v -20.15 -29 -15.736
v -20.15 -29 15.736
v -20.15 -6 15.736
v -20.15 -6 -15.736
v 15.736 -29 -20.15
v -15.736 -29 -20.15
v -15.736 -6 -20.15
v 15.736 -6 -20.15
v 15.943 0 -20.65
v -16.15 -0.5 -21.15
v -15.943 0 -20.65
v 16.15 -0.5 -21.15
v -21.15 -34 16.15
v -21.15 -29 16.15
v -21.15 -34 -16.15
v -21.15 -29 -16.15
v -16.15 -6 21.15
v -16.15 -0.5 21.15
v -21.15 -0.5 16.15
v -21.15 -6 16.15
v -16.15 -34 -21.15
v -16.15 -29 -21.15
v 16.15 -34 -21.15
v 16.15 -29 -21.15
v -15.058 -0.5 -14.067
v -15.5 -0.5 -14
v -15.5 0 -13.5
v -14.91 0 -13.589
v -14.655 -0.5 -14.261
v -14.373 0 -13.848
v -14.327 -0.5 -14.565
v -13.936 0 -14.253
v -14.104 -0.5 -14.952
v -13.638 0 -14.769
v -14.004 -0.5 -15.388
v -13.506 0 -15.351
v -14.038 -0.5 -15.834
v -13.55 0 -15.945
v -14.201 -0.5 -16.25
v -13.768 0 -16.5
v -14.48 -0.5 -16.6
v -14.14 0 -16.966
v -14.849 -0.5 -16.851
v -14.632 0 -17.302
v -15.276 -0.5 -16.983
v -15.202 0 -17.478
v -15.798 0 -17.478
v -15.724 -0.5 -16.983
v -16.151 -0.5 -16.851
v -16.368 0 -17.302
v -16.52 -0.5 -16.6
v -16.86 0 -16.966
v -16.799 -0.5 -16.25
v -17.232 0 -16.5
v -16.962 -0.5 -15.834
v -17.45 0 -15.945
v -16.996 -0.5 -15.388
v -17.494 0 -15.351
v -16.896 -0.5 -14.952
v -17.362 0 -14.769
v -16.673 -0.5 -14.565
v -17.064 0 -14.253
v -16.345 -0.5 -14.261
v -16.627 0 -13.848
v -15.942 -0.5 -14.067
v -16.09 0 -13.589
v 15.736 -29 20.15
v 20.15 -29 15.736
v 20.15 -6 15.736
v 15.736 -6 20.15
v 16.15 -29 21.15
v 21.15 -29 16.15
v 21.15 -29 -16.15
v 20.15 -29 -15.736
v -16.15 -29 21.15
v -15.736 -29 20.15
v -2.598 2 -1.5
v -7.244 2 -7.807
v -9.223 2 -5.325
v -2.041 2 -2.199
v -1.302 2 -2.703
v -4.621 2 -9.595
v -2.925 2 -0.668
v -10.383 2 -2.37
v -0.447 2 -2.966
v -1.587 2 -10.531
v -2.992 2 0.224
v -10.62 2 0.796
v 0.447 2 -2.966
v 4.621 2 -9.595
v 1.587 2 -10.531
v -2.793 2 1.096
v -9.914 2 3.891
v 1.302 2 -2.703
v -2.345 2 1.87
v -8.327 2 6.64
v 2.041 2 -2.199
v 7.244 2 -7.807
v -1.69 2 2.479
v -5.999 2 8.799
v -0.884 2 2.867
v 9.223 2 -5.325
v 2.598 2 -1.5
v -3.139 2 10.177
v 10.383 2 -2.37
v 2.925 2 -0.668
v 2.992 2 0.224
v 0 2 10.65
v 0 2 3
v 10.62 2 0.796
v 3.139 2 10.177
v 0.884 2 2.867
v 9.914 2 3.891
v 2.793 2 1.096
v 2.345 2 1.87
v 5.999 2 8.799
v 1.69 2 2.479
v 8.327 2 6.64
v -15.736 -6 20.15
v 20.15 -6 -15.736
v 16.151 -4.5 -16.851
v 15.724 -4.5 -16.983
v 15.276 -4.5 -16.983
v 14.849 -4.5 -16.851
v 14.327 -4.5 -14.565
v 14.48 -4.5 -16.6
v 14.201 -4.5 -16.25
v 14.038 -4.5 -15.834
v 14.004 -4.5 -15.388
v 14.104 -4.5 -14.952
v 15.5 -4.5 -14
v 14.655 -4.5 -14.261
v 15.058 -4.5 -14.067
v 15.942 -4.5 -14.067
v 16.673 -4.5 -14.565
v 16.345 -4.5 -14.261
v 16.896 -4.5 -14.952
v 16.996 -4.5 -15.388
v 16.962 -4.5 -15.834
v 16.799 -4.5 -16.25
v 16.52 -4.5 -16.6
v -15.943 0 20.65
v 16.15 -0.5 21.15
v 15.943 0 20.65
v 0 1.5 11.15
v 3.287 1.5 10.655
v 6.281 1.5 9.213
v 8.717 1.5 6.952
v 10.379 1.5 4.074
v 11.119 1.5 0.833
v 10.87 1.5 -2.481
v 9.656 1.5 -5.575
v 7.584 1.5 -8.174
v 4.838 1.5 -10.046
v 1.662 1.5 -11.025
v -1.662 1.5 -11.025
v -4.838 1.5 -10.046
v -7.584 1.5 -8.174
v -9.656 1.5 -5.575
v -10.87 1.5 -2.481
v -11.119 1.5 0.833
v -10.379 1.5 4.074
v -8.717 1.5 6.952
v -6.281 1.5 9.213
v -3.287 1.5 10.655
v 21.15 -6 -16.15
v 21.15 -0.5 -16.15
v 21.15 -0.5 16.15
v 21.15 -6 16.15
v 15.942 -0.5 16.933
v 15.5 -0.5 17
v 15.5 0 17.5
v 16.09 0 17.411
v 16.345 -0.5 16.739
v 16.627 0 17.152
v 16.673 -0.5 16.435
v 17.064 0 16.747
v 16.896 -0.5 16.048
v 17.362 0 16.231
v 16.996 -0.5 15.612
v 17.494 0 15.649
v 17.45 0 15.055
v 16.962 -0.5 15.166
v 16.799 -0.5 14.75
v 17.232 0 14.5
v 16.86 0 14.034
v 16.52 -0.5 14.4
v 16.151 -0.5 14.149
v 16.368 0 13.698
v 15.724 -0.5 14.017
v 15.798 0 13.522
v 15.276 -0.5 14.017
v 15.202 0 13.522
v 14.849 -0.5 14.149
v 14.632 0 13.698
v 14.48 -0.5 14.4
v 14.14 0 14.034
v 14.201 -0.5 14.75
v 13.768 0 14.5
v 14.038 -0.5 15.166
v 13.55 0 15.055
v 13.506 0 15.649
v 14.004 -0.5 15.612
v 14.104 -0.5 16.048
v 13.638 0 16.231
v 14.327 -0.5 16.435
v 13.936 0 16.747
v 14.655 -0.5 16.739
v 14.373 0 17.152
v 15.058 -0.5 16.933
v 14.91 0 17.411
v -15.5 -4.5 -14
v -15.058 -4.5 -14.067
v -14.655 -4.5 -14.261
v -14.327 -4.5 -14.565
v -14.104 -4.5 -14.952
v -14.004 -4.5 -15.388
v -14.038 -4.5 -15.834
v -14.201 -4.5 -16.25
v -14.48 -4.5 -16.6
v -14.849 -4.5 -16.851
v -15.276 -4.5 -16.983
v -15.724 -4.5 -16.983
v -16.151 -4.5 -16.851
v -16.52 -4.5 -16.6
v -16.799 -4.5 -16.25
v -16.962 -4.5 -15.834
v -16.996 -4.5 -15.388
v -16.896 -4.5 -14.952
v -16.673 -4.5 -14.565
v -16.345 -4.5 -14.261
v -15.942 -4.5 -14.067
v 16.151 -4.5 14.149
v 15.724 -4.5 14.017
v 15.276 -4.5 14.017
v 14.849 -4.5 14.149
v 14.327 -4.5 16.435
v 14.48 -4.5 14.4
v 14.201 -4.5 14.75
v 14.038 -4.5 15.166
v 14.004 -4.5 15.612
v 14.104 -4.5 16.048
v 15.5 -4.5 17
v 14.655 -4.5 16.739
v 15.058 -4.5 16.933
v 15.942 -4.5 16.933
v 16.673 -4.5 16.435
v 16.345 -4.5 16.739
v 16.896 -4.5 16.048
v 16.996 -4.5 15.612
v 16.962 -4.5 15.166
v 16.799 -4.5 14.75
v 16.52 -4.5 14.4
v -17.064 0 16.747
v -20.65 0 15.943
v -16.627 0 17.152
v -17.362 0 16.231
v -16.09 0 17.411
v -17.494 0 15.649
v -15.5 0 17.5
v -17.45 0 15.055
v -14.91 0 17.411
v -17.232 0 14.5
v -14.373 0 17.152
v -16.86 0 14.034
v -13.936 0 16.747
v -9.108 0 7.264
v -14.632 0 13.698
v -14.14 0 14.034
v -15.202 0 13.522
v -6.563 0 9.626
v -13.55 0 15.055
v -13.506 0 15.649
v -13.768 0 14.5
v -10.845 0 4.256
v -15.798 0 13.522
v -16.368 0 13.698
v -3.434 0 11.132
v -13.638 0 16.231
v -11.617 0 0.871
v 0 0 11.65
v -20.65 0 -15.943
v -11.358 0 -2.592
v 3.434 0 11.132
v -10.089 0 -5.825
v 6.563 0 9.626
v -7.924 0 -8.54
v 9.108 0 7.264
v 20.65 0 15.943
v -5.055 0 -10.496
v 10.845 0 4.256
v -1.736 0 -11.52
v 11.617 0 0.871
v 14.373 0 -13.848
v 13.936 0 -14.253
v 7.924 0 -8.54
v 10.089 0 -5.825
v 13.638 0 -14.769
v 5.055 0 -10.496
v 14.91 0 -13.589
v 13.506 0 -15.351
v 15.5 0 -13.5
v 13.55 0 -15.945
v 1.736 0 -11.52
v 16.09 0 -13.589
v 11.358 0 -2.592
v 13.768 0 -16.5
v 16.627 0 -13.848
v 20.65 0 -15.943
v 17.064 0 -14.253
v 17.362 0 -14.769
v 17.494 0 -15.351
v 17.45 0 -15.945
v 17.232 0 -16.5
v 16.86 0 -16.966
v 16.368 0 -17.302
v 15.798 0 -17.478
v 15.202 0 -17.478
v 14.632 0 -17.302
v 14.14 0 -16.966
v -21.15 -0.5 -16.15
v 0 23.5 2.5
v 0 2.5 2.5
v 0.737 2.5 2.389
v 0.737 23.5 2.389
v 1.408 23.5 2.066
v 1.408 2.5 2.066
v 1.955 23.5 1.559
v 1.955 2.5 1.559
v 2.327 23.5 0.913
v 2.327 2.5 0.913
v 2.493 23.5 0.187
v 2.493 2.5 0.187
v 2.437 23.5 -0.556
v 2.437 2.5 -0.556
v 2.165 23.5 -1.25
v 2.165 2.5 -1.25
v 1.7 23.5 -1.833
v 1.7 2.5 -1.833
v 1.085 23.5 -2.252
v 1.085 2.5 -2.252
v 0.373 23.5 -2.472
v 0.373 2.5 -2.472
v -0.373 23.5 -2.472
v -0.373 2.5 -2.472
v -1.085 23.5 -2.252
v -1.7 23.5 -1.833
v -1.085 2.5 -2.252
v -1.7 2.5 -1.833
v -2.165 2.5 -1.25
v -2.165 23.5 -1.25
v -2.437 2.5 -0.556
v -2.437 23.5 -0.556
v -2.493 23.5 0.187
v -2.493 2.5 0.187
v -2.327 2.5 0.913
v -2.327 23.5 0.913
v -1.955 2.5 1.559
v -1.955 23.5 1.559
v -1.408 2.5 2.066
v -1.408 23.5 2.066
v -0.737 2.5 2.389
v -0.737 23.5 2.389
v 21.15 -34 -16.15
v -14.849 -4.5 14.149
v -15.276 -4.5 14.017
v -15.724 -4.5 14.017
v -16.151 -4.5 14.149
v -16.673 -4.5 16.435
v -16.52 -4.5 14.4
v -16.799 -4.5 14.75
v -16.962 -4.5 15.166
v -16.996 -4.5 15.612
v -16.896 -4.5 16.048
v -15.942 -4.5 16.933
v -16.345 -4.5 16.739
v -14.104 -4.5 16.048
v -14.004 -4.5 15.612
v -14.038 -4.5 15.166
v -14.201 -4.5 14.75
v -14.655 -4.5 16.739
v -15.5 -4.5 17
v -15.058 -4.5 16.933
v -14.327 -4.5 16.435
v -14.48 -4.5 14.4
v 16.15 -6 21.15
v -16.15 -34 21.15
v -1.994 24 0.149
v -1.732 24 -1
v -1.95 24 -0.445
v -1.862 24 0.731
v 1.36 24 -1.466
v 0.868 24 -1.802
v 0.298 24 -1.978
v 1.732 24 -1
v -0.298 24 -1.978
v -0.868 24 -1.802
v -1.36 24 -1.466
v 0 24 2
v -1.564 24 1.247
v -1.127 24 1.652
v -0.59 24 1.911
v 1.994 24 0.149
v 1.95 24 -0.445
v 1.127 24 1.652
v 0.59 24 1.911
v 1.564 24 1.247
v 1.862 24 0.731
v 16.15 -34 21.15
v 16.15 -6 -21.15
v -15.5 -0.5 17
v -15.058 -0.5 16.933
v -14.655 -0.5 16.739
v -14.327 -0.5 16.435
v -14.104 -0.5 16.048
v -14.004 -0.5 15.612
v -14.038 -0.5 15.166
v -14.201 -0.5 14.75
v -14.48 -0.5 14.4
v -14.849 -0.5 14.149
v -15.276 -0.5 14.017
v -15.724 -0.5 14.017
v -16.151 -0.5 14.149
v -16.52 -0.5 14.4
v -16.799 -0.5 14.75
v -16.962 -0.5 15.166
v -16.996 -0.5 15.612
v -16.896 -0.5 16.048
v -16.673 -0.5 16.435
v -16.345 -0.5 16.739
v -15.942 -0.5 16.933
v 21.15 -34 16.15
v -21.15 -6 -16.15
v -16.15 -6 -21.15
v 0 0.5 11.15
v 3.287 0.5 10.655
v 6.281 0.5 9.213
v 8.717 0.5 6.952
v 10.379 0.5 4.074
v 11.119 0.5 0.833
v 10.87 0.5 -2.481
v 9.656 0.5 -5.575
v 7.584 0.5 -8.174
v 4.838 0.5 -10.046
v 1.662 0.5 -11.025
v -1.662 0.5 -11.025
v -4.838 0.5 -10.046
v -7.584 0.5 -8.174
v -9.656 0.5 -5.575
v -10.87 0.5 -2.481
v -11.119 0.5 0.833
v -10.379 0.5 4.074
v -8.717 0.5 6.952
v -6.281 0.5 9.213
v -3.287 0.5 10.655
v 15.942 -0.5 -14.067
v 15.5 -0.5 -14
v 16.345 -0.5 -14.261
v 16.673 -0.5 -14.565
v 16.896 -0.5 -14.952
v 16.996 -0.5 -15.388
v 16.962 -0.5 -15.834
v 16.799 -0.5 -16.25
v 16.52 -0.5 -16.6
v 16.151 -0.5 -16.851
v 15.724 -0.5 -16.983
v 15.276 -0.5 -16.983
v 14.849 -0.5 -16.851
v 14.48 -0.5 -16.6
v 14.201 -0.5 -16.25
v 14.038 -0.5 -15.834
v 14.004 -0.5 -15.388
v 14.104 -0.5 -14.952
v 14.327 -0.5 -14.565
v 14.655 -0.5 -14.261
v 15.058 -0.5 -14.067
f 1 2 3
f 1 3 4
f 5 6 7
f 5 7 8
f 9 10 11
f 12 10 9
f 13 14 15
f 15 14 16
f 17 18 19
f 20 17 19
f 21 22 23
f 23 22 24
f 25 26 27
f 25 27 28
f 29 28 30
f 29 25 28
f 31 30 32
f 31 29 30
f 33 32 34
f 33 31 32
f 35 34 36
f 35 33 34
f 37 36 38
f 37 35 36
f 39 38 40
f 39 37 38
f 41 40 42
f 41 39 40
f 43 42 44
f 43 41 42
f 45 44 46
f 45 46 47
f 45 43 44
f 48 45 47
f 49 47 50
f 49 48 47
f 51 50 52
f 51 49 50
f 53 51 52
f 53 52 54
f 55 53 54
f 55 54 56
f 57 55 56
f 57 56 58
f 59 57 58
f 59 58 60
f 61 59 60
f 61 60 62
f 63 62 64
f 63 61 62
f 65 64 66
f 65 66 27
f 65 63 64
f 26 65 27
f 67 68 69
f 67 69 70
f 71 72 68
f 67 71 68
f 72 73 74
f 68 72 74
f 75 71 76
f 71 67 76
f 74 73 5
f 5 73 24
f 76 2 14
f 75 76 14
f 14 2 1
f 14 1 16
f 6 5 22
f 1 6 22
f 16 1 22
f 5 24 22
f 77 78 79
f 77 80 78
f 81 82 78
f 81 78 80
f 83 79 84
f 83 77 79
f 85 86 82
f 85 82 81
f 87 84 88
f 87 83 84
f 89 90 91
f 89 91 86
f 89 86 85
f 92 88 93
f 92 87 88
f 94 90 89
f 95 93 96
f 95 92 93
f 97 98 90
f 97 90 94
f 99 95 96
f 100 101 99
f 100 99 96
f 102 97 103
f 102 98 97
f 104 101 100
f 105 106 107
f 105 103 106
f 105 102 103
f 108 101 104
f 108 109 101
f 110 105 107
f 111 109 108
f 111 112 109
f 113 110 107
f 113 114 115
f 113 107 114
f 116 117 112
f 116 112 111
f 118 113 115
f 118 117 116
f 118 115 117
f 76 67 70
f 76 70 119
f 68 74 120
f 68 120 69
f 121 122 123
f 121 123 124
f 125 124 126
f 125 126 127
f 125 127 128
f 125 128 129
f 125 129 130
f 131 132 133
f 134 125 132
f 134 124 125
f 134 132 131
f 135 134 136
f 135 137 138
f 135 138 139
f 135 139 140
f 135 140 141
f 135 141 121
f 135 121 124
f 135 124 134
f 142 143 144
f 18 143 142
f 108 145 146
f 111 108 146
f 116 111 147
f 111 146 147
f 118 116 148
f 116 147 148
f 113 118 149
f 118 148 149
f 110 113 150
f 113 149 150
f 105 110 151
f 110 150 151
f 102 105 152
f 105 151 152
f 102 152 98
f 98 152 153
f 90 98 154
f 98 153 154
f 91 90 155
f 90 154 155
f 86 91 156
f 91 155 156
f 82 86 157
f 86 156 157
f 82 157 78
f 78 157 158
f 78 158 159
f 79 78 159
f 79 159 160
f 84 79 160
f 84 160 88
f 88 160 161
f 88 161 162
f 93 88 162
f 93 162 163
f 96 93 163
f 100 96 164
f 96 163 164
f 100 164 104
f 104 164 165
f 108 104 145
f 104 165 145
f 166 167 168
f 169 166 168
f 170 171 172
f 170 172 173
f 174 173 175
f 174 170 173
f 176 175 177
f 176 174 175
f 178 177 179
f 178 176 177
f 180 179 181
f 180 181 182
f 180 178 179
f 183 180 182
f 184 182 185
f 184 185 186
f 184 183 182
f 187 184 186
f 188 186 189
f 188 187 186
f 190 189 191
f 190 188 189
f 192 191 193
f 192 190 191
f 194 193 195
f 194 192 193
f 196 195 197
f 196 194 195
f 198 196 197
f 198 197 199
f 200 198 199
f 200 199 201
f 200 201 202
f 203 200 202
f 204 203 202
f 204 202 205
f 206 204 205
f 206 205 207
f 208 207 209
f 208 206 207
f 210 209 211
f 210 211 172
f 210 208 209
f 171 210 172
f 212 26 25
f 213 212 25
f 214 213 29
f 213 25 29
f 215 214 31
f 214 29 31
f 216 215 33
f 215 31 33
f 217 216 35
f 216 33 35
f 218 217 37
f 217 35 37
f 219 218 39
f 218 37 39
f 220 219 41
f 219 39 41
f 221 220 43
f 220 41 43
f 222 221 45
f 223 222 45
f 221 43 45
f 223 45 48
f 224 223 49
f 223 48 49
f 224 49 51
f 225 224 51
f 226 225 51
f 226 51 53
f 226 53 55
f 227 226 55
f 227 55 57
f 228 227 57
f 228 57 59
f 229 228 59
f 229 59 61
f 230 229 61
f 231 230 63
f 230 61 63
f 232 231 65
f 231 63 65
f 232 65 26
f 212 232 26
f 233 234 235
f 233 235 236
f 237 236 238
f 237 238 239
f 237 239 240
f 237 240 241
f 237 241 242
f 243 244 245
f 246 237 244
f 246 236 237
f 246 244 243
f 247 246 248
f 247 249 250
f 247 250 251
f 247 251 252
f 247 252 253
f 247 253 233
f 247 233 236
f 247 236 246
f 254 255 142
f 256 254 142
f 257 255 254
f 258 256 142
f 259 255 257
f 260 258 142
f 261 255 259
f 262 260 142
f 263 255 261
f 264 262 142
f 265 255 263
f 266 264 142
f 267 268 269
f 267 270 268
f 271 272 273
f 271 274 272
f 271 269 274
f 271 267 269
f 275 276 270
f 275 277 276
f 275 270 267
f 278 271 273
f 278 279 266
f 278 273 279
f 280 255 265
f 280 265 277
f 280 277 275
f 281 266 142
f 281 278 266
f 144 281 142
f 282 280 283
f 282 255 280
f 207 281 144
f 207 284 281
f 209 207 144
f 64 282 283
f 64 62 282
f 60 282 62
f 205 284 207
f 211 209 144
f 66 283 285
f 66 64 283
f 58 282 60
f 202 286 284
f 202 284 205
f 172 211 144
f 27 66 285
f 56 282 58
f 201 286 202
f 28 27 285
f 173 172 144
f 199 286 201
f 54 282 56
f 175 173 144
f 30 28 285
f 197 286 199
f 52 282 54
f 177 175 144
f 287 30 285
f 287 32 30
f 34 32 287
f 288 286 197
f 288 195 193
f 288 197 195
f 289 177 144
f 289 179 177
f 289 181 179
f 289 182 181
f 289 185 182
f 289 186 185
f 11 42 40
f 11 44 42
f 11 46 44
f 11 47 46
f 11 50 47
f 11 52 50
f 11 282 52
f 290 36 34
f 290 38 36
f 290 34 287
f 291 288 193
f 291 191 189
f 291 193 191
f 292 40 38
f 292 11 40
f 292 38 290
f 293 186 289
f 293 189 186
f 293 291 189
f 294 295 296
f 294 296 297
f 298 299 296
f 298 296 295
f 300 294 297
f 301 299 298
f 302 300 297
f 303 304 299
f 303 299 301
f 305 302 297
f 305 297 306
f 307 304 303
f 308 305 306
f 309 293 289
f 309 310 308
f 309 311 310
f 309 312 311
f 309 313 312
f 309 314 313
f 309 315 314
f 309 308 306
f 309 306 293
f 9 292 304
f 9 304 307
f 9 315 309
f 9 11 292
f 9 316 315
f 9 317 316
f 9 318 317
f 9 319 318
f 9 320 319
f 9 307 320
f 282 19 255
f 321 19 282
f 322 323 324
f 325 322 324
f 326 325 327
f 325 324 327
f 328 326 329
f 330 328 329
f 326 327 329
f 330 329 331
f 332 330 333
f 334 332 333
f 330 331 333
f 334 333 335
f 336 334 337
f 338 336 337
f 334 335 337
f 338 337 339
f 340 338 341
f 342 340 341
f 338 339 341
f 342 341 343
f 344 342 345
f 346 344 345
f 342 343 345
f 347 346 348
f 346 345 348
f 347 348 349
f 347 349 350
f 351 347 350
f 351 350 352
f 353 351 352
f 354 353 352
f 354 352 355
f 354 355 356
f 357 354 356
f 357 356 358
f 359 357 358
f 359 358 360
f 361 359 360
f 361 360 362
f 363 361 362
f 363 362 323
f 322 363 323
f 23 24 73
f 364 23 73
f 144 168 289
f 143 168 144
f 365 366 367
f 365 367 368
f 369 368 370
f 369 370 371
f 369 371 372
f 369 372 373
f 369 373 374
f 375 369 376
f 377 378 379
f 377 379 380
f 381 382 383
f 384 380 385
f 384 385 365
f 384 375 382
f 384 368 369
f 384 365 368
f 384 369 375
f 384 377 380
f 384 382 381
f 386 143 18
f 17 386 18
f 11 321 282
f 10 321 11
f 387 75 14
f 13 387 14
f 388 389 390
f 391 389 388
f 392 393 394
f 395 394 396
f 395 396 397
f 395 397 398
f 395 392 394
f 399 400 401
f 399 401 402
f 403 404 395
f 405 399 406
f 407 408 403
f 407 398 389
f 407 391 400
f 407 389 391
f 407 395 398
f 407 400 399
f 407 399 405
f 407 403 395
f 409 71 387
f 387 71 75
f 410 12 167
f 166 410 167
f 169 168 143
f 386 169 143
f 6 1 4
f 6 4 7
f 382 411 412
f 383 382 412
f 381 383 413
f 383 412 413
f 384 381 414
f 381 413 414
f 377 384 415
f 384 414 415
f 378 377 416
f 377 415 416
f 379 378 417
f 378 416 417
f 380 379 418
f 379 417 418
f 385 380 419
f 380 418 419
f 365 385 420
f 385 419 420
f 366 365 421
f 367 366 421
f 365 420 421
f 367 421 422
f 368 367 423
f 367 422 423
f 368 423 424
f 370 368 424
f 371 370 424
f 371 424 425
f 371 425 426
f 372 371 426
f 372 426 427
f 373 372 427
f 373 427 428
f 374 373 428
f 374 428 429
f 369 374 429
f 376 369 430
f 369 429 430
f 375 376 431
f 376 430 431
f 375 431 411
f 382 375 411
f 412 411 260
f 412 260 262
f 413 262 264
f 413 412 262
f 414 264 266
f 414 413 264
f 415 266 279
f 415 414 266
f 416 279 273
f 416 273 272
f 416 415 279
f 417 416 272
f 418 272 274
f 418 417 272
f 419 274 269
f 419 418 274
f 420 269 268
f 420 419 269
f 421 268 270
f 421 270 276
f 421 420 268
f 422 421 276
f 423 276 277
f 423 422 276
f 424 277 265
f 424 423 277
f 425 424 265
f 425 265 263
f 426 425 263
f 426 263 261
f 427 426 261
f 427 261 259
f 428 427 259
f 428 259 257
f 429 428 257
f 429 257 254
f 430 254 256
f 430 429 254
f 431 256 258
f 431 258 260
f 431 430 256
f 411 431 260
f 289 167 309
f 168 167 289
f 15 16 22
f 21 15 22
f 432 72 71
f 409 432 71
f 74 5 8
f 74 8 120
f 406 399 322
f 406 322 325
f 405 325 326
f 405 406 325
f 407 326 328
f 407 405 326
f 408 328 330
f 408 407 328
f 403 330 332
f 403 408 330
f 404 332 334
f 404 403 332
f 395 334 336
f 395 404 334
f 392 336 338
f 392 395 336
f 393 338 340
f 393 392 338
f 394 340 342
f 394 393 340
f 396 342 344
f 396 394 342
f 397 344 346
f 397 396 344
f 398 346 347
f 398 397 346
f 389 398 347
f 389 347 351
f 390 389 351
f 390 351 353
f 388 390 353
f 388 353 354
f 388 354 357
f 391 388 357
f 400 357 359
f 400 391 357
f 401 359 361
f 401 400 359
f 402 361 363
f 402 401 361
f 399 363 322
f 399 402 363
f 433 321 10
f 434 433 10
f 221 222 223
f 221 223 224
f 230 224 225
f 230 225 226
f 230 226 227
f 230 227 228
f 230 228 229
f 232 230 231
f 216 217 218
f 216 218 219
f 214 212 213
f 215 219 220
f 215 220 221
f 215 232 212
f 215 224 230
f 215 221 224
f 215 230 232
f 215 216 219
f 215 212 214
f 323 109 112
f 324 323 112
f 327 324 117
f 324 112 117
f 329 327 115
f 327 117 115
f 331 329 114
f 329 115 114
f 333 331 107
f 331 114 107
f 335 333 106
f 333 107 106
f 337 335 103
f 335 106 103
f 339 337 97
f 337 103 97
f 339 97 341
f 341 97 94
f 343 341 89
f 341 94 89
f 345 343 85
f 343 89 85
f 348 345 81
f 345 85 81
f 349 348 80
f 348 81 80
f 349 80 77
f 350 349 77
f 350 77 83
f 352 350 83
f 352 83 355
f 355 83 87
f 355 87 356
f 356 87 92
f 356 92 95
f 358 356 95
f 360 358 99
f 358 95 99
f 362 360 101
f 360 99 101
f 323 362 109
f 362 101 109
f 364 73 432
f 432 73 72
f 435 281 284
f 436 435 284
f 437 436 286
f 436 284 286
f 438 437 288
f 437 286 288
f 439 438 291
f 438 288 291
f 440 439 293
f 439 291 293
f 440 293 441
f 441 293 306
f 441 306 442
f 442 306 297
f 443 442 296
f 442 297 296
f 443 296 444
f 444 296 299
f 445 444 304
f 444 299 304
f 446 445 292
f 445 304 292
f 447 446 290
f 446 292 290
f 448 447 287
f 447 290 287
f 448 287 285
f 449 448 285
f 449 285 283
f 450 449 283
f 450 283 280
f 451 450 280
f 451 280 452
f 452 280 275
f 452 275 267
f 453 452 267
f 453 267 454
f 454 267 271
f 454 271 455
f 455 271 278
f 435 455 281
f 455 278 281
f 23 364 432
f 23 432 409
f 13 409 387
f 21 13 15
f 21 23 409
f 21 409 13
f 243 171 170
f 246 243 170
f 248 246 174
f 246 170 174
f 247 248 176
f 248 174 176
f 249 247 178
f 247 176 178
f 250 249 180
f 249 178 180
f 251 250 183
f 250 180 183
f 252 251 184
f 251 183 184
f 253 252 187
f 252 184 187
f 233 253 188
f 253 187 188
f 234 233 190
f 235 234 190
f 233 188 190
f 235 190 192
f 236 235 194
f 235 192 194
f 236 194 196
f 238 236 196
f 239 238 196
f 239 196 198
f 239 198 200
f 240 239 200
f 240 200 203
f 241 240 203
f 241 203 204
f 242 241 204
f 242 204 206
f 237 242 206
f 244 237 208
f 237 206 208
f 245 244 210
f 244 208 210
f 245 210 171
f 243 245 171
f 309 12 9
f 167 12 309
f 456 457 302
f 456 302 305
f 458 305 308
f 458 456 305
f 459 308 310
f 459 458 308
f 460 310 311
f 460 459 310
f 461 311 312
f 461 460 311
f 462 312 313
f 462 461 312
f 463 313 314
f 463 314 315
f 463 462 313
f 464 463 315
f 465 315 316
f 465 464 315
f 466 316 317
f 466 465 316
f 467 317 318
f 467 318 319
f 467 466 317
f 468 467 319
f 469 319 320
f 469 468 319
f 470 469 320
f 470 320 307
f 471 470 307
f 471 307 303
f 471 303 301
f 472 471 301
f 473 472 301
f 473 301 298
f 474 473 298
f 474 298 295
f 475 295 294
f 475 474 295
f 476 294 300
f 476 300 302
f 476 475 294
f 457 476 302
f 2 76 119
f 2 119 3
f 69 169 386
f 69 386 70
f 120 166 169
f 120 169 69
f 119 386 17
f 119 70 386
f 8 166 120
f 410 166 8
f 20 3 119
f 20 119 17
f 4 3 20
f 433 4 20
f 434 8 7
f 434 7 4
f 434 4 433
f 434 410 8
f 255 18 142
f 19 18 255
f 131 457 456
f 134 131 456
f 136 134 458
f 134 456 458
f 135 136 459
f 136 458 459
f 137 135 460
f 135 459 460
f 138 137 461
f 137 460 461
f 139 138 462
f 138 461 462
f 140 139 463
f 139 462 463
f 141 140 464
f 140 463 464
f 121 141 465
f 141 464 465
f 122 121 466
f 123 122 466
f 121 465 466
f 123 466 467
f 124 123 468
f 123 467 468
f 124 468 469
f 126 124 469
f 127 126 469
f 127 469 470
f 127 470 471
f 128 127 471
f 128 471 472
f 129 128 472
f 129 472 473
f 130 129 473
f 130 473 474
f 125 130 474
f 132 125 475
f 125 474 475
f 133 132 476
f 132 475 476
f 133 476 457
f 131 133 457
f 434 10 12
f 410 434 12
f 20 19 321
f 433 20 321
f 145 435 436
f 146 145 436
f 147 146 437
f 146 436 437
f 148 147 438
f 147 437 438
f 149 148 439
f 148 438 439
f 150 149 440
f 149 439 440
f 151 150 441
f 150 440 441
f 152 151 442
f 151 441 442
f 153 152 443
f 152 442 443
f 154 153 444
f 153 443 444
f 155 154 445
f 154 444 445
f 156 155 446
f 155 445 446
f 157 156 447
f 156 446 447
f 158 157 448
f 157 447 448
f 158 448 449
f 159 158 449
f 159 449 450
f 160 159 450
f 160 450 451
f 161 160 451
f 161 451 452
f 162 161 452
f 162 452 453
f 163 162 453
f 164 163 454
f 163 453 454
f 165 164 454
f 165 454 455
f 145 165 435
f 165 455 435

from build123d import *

# Parameters (mm, degrees)
EXTRUDE_1_DEPTH     = 34
SKETCH_1_3_R        = 1.5
CUT_EXTRUDE_1_DEPTH = 4.5
SKETCH_1_4_R        = 11.15
SKETCH_1_4_R_2      = 2.5
EXTRUDE_2_DEPTH     = 2
SKETCH_1_5_R        = 2.5
EXTRUDE_3_DEPTH     = 24
CHAMFER_1_SIZE      = 0.5
CUT_EXTRUDE_2_DEPTH = 23


with BuildPart() as part:
    # 스케치1 → 보스-돌출1 (new body)
    with BuildSketch(Plane(origin=(0, 0, 0), x_dir=(1, 0, 0), z_dir=(0, 1, 0))):
        Polygon((-16.15, 21.15), (-21.15, 16.15), (-21.15, -16.15), (-16.15, -21.15), (16.15, -21.15), (21.15, -16.15), (21.15, 16.15), (16.15, 21.15), align=None)
    extrude(amount=-EXTRUDE_1_DEPTH)

    # 스케치1<3> → 컷-돌출1 (cut)
    with BuildSketch(Plane(origin=(0, 0, 0), x_dir=(1, 0, 0), z_dir=(0, 1, 0))):
        with Locations((-15.5, 15.5)):
            Circle(SKETCH_1_3_R)
        with Locations((15.5, 15.5)):
            Circle(SKETCH_1_3_R)
        with Locations((15.5, -15.5)):
            Circle(SKETCH_1_3_R)
        with Locations((-15.5, -15.5)):
            Circle(SKETCH_1_3_R)
    extrude(amount=-CUT_EXTRUDE_1_DEPTH, mode=Mode.SUBTRACT)

    # 스케치1<4> → 보스-돌출2 (add)
    with BuildSketch(Plane(origin=(0, 0, 0), x_dir=(1, 0, 0), z_dir=(0, 1, 0))):
        Circle(SKETCH_1_4_R)
        Circle(SKETCH_1_4_R_2, mode=Mode.SUBTRACT)
    extrude(amount=EXTRUDE_2_DEPTH)

    # 스케치1<5> → 보스-돌출3 (add)
    with BuildSketch(Plane(origin=(0, 0, 0), x_dir=(1, 0, 0), z_dir=(0, 1, 0))):
        Circle(SKETCH_1_5_R)
    extrude(amount=EXTRUDE_3_DEPTH)

    # 모따기1
    chamfer_1_edges = [part.edges().sort_by_distance(p)[0] for p in [
        (-2.5, 24, 0),
        (-11.15, 2, 0),
        (-2.5, 2, 0),
        (-11.15, 0, 0),
        (14, 0, 15.5),
        (-17, 0, 15.5),
        (-17, 0, -15.5),
        (-18.65, 0, -18.65),
        (0, 0, -21.15),
        (18.65, 0, -18.65),
        (21.15, 0, 0),
        (18.65, 0, 18.65),
        (0, 0, 21.15),
        (-18.65, 0, 18.65),
        (-21.15, 0, 0),
        (14, 0, -15.5),
    ]]
    chamfer(chamfer_1_edges, length=CHAMFER_1_SIZE)

    # 스케치2 → 컷-돌출2 (cut)
    with BuildSketch(Plane(origin=(0, -29, 0), x_dir=(-1, 0, 0), z_dir=(0, -1, 0))):
        Polygon((21.15, -16.15), (21.15, 16.15), (16.15, 21.15), (-16.15, 21.15), (-21.15, 16.15), (-21.15, -16.15), (-16.15, -21.15), (16.15, -21.15), align=None)
        Polygon((20.15, -15.735786438), (20.15, 15.735786438), (15.735786438, 20.15), (-15.735786438, 20.15), (-20.15, 15.735786438), (-20.15, -15.735786438), (-15.735786438, -20.15), (15.735786438, -20.15), align=None, mode=Mode.SUBTRACT)
    extrude(amount=-CUT_EXTRUDE_2_DEPTH, mode=Mode.SUBTRACT)


solid = part.part
